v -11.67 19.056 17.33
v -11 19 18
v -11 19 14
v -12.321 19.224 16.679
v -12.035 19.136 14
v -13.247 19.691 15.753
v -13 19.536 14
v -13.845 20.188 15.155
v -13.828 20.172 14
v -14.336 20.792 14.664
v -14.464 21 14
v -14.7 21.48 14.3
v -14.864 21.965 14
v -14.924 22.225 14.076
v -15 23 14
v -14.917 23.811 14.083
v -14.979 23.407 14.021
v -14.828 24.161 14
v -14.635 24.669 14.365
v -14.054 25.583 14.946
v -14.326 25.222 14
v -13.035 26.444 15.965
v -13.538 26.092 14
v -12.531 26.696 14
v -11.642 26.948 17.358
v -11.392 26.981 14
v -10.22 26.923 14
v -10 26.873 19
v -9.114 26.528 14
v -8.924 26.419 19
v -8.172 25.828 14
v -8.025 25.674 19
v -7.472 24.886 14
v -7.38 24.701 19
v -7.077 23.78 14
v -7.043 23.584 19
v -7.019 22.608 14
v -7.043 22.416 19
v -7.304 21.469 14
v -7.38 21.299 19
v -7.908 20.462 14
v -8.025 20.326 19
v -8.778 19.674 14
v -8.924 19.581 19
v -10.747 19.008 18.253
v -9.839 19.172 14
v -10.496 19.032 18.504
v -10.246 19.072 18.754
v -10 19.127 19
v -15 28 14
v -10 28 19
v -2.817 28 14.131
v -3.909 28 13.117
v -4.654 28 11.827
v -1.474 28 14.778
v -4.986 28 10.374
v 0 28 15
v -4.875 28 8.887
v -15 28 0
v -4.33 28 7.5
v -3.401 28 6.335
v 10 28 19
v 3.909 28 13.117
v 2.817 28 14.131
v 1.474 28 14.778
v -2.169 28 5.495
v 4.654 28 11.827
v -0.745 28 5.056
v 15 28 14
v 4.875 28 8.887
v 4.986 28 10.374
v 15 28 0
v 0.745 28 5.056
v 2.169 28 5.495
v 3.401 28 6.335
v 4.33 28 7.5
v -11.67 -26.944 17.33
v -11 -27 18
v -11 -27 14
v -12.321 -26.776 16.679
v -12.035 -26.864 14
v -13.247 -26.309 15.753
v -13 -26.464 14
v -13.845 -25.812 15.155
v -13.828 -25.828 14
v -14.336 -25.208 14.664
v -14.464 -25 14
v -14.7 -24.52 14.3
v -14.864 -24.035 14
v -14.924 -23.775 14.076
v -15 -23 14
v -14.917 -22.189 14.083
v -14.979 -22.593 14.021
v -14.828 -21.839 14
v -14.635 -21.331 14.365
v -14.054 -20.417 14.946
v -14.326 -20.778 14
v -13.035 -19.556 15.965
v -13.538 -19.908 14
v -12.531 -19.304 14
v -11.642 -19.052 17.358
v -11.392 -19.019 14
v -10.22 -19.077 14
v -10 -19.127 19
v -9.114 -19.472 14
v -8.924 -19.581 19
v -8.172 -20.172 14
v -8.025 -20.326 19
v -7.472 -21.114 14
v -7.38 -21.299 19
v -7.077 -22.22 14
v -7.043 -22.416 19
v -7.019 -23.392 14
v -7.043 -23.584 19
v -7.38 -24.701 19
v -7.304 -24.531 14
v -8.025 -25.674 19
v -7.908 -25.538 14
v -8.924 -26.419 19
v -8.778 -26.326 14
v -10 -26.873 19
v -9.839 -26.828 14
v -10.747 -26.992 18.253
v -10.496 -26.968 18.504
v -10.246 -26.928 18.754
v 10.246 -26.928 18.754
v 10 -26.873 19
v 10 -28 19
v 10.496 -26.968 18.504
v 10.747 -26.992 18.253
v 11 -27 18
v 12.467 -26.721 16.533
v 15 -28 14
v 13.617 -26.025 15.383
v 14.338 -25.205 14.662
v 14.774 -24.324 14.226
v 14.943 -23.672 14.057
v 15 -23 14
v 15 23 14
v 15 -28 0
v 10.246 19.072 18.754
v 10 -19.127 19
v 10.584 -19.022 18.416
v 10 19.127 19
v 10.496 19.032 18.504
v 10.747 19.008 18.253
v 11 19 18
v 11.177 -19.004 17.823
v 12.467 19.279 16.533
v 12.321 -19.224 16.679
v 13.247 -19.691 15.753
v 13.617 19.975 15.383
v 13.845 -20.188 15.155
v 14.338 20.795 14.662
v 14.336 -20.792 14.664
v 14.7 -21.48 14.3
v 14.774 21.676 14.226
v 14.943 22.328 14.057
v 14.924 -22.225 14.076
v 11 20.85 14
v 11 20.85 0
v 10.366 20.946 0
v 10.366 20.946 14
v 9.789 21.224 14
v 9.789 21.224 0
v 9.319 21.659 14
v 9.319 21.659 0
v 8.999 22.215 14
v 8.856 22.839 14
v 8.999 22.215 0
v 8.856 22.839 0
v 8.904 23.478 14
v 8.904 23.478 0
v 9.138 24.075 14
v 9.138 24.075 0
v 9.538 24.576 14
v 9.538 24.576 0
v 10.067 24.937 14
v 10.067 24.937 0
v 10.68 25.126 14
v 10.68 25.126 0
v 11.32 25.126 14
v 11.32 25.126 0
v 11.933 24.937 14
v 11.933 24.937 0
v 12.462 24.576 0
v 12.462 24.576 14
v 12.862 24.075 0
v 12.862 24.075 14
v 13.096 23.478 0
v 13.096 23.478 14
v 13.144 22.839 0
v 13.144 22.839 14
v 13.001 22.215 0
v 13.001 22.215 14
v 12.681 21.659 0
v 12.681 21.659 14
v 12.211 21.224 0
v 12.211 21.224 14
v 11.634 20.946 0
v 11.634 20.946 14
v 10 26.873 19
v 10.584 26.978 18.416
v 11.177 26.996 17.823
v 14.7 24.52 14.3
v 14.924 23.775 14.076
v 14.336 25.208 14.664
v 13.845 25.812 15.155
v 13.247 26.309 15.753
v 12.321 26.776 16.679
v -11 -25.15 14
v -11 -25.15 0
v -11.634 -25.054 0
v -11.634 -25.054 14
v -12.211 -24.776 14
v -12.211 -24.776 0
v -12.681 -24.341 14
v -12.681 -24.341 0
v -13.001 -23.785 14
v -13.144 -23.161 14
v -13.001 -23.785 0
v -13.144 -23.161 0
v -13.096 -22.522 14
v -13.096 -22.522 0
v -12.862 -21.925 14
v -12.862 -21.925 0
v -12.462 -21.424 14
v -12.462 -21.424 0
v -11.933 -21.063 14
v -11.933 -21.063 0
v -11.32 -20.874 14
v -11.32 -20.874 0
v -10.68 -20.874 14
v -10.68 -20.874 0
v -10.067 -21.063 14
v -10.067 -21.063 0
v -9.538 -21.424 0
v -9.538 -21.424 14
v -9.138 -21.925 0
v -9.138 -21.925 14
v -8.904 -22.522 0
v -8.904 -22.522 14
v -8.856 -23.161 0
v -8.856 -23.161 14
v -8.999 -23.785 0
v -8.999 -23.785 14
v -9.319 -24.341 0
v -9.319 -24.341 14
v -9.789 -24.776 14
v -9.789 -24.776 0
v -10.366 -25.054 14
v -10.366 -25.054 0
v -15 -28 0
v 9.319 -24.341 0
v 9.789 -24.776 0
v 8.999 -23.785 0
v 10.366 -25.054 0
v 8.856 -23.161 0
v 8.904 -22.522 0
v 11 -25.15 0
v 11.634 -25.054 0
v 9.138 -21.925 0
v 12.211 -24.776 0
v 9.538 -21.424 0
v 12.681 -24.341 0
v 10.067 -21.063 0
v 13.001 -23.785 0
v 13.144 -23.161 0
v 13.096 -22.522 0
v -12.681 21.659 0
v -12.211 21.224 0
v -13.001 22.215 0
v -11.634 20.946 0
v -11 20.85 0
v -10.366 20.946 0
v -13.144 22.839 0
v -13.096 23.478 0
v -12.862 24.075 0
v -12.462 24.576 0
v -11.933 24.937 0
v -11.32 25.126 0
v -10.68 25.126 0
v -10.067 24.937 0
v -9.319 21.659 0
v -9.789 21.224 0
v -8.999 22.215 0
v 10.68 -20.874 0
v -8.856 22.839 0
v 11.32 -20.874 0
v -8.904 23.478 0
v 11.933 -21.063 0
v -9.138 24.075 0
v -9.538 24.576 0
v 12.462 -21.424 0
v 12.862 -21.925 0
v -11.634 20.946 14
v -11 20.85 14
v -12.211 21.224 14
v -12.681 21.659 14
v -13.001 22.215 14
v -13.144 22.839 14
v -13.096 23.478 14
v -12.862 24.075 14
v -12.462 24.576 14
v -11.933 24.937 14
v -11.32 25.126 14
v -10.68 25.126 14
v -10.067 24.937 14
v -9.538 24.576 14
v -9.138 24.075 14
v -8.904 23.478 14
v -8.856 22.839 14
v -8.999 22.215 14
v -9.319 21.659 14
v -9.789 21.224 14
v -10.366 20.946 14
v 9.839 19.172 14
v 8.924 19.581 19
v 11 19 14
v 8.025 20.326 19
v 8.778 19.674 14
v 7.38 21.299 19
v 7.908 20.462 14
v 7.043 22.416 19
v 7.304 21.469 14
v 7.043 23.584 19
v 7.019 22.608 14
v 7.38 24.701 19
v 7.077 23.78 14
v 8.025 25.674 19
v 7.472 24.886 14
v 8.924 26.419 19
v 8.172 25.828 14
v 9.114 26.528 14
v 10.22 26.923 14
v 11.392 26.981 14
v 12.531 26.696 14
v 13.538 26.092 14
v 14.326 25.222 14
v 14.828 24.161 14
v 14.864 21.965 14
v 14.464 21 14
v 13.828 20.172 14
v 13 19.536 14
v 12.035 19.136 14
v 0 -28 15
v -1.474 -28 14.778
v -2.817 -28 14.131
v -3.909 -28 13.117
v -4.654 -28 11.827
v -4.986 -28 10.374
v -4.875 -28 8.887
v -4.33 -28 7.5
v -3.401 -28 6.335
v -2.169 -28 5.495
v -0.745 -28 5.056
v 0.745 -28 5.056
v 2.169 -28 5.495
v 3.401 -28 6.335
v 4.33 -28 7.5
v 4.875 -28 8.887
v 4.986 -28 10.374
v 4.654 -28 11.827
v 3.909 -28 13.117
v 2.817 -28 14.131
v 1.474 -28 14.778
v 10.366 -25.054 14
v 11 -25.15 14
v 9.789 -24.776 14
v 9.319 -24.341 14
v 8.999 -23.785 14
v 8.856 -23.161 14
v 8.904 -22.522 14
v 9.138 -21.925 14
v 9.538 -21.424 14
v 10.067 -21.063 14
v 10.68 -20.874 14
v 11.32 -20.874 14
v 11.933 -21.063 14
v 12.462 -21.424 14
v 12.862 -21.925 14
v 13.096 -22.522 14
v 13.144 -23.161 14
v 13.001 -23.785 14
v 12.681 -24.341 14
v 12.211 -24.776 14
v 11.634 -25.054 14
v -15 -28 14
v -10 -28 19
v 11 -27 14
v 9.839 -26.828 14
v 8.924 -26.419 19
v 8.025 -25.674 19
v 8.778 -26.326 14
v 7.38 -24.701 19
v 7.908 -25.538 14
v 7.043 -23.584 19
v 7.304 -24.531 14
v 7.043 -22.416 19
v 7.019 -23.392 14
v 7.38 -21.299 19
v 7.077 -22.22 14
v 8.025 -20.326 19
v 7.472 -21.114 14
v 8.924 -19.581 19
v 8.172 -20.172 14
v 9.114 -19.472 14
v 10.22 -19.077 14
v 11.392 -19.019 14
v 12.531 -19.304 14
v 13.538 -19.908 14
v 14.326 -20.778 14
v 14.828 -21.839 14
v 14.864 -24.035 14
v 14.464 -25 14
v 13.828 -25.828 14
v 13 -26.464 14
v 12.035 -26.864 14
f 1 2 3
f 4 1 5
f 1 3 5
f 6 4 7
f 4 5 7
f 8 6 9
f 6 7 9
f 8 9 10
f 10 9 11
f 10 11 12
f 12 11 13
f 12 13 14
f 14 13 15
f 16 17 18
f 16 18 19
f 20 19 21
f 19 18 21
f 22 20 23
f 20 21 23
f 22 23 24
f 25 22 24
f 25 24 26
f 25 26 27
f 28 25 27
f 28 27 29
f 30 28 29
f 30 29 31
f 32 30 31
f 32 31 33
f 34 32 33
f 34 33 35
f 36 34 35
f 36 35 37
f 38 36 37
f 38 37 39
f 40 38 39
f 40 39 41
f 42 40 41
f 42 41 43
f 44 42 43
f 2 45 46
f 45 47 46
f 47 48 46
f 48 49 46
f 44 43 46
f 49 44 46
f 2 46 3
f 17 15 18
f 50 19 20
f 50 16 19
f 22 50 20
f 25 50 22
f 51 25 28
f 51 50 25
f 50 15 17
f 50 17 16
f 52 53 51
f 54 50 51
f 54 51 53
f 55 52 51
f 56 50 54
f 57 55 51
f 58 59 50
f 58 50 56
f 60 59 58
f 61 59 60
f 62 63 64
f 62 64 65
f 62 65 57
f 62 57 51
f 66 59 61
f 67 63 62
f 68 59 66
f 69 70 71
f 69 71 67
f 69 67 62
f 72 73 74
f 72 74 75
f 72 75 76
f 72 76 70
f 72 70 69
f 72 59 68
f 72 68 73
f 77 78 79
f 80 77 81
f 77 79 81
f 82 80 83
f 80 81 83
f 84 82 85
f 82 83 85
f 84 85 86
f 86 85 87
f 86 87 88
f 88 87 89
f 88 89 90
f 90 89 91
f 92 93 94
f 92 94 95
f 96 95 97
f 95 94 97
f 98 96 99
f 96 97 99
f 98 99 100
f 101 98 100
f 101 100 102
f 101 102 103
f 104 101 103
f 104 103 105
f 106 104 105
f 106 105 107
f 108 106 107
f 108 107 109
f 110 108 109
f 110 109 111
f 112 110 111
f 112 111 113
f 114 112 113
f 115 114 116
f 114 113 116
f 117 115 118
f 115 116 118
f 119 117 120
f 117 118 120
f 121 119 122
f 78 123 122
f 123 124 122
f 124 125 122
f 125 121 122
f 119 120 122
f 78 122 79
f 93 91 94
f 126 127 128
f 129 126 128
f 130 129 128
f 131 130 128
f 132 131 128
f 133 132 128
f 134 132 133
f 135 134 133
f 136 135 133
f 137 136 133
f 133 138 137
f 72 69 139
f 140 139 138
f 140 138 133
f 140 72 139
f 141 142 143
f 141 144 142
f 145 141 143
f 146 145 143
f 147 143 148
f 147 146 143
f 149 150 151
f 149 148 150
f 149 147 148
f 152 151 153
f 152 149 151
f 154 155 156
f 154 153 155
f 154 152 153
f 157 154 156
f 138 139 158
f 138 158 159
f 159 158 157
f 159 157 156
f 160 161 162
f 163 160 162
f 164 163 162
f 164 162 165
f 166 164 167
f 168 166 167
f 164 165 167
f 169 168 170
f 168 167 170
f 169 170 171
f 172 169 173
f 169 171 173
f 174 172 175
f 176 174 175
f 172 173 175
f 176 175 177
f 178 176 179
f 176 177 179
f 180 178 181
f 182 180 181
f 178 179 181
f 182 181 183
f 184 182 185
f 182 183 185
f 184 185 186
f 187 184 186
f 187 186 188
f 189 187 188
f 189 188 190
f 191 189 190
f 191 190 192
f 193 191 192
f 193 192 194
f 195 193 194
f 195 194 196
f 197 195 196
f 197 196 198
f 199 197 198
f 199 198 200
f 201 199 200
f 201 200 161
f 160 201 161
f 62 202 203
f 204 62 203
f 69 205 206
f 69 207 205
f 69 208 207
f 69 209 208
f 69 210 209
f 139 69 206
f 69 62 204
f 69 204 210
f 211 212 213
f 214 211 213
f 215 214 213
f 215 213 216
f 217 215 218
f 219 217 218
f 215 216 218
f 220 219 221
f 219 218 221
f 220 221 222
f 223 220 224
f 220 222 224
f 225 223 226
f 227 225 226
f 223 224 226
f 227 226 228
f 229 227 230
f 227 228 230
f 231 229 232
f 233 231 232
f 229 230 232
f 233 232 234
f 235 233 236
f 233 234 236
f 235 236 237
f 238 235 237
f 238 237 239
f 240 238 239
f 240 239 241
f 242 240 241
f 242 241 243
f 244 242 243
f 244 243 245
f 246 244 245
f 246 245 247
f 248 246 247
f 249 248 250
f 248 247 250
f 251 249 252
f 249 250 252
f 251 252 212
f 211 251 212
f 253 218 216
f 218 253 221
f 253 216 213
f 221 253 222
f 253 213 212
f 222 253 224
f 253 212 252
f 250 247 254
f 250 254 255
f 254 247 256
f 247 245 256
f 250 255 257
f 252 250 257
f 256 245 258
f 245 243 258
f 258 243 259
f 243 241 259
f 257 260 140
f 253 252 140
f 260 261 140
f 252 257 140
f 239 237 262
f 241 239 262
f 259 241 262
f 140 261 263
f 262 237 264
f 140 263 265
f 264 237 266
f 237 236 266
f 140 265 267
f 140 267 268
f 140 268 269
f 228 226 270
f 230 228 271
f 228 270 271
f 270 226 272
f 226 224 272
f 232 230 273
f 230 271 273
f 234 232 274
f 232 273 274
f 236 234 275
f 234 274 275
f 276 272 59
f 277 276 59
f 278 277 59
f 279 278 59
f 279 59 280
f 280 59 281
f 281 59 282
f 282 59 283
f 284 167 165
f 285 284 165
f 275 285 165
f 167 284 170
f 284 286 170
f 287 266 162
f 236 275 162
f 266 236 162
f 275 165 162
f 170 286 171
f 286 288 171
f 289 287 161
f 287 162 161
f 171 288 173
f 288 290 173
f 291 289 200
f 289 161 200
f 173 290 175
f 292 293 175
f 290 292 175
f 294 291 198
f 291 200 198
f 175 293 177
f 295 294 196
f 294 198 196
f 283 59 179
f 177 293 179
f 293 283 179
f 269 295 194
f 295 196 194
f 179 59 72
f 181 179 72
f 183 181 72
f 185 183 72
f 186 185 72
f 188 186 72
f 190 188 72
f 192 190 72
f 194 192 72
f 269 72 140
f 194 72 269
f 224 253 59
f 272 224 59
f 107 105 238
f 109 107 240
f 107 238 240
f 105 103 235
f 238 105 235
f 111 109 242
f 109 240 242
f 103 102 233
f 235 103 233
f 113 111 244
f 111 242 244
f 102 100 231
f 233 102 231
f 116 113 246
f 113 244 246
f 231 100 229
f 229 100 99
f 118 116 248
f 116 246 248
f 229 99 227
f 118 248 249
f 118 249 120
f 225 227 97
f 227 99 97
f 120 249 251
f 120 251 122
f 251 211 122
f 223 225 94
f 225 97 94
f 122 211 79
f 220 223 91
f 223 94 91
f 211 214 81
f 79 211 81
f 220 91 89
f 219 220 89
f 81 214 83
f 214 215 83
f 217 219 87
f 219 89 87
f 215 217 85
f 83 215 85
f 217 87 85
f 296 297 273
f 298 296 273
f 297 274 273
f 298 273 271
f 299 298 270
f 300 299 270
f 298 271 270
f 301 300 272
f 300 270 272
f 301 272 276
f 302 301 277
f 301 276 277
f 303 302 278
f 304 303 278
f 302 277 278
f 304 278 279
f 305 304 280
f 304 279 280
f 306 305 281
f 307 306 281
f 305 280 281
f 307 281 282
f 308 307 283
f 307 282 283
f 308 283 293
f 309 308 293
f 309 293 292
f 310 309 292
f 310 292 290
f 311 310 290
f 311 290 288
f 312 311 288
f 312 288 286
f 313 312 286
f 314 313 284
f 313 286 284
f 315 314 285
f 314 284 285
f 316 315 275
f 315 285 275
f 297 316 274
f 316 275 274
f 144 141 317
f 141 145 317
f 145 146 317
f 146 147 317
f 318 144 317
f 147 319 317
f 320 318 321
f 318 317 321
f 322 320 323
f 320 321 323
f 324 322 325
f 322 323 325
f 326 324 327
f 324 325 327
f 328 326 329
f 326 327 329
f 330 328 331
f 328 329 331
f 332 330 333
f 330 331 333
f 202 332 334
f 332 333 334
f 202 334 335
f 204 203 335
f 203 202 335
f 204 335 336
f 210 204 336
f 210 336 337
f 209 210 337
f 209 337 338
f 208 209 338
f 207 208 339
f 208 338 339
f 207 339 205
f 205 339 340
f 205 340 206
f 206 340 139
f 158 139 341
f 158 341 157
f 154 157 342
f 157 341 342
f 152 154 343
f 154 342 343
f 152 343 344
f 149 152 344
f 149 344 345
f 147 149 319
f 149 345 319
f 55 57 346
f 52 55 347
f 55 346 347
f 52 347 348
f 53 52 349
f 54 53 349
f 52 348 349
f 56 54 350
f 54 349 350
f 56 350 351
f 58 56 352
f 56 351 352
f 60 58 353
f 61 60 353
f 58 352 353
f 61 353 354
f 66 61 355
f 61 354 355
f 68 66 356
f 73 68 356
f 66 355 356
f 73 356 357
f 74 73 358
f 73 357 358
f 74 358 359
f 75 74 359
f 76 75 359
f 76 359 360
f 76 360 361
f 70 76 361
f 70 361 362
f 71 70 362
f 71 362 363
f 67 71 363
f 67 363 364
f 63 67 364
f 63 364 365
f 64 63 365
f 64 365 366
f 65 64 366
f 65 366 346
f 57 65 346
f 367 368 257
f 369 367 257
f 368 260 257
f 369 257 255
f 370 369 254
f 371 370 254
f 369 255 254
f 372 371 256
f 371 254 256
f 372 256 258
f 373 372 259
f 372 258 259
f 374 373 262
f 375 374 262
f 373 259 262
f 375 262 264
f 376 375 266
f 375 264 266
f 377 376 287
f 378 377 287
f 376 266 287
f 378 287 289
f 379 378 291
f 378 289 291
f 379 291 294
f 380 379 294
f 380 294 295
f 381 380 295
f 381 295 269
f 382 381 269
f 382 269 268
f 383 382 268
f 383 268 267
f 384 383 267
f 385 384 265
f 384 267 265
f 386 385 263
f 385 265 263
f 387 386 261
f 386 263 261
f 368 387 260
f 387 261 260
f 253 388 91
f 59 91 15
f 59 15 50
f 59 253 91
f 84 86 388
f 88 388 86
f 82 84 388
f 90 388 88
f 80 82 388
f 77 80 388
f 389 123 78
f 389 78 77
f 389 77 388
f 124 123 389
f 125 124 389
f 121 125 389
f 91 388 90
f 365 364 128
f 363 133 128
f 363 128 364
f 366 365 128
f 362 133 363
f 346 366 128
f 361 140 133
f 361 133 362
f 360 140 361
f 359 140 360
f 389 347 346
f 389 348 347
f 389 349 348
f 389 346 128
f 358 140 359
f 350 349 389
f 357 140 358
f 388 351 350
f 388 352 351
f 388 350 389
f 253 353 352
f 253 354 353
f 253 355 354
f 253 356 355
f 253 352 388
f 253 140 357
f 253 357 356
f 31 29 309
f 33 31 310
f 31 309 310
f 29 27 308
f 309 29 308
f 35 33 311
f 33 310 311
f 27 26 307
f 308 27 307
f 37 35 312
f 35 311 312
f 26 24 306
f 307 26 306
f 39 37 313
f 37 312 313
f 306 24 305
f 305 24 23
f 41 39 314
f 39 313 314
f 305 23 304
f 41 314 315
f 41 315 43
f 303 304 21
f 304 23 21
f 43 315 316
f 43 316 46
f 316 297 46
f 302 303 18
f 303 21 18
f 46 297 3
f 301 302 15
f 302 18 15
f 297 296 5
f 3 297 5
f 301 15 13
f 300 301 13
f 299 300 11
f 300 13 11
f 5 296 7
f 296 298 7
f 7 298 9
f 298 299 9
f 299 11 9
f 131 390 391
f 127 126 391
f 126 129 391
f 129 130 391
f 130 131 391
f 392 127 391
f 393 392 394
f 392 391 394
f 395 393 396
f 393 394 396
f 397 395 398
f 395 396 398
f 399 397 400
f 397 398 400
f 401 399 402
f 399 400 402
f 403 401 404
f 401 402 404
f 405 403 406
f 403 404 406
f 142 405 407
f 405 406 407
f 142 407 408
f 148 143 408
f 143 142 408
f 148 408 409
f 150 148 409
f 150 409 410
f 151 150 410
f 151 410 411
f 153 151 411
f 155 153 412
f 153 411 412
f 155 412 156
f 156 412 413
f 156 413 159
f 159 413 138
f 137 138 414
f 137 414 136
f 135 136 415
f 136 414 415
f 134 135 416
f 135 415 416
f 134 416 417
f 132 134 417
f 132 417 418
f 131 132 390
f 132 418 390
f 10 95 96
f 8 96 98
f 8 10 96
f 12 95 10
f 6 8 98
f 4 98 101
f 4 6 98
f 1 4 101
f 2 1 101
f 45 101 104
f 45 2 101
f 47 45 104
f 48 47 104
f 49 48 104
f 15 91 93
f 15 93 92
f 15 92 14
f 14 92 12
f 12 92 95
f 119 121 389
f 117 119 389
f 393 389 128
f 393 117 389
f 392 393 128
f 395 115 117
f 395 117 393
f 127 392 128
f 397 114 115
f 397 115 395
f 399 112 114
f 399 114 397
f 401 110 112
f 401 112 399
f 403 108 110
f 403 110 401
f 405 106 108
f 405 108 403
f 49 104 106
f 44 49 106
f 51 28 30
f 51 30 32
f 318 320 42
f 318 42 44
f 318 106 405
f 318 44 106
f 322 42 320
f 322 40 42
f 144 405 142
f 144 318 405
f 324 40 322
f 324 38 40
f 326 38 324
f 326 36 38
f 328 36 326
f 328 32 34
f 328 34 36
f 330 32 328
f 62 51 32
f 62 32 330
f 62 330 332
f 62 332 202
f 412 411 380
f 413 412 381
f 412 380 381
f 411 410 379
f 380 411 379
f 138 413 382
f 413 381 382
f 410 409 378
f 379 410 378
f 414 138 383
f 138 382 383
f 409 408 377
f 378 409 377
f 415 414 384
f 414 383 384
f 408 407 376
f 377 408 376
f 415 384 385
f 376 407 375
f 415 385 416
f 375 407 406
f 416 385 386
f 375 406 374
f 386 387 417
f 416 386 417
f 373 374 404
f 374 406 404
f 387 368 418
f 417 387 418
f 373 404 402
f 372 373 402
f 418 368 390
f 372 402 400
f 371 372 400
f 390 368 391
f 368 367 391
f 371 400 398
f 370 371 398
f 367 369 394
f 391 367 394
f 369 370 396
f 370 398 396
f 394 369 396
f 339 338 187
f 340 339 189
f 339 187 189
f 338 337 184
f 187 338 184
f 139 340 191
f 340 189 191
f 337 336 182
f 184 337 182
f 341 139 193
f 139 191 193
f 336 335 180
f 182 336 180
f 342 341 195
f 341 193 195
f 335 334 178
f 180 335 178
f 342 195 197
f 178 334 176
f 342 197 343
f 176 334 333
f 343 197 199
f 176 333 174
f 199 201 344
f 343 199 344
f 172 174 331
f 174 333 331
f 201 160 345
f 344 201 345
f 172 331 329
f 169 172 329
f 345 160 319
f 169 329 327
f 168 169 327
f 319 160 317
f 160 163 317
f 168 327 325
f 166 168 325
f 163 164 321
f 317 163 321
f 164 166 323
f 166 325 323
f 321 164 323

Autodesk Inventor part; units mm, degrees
ref_plane "YZ Plane" through (0, 0, 0) normal (1, 0, 0) x (0, 1, 0)
ref_plane "XZ Plane" through (0, 0, 0) normal (0, 1, 0) x (-1, 0, 0)
ref_plane "XY Plane" through (0, 0, 0) normal (0, 0, 1) x (1, 0, 0)
sketch "スケッチ1" plane through (0, 0, 0) normal (0, 0, 1) x (1, 0, 0)
  line L0 (-15, 28) -> (15, 28)
  line L1 (15, 28) -> (15, -28)
  line L2 (15, -28) -> (-15, -28)
  line L3 (-15, -28) -> (-15, 28)
  point P0 (0, 0)
  point P1 (15, 0)
  point P2 (0, -28)
  dimension "d0" = 30
  dimension "d1" = 56
extrude "押し出し1" add sketch "スケッチ1" along normal blind 19
sketch "スケッチ2" plane through (0, 0, 19) normal (0, 0, 1) x (1, 0, 0)
  line L0 (-15, -28) -> (-15, 28) projected
  line L1 (15, -28) -> (-15, -28) projected
  point P0 (0, 0)
  point P1 (-11, -23)
  dimension "d4" = 4
  dimension "d5" = 5
hole "穴1" at (-11, -23, 19) direction (0, 0, -1) diameter 4.3 end through all counterbore diameter 8 counterbore depth 5
pattern_linear "矩形状パターン1" count 2 spacing 22 along (1, 0, 0) count 2 spacing 46 along (0, 1, 0) of "穴1"
sketch "スケッチ3" plane through (-15, 28, 0) normal (0, 1, 0) x (1, 0, 0)
  line L0 (0, 0) -> (30, 0) projected
  point P0 (15, 0)
  point P1 (15, -10)
  point P2 (15, 0)
  dimension "d19" = 10
hole "穴2" at (0, 28, 10) direction (0, -1, 0) diameter 10 end through all
sketch "スケッチ4" plane through (-15, 28, 0) normal (0, 1, 0) x (1, 0, 0)
  line L0 (0, -19) -> (30, -19) projected
  line L1 (0, 0) -> (0, -19) projected
  line L2 (0, -14) -> (5, -19)
  point P0 (15, 0)
  dimension "d30" = 5
  dimension "d31" = 5
extrude "押し出し2" cut sketch "スケッチ4" against normal through all
mirror "ミラー1" about plane through (0, 0, 0) normal (1, 0, 0) of "押し出し2"
properties part number "MHCAW10" material "MISUMI"
